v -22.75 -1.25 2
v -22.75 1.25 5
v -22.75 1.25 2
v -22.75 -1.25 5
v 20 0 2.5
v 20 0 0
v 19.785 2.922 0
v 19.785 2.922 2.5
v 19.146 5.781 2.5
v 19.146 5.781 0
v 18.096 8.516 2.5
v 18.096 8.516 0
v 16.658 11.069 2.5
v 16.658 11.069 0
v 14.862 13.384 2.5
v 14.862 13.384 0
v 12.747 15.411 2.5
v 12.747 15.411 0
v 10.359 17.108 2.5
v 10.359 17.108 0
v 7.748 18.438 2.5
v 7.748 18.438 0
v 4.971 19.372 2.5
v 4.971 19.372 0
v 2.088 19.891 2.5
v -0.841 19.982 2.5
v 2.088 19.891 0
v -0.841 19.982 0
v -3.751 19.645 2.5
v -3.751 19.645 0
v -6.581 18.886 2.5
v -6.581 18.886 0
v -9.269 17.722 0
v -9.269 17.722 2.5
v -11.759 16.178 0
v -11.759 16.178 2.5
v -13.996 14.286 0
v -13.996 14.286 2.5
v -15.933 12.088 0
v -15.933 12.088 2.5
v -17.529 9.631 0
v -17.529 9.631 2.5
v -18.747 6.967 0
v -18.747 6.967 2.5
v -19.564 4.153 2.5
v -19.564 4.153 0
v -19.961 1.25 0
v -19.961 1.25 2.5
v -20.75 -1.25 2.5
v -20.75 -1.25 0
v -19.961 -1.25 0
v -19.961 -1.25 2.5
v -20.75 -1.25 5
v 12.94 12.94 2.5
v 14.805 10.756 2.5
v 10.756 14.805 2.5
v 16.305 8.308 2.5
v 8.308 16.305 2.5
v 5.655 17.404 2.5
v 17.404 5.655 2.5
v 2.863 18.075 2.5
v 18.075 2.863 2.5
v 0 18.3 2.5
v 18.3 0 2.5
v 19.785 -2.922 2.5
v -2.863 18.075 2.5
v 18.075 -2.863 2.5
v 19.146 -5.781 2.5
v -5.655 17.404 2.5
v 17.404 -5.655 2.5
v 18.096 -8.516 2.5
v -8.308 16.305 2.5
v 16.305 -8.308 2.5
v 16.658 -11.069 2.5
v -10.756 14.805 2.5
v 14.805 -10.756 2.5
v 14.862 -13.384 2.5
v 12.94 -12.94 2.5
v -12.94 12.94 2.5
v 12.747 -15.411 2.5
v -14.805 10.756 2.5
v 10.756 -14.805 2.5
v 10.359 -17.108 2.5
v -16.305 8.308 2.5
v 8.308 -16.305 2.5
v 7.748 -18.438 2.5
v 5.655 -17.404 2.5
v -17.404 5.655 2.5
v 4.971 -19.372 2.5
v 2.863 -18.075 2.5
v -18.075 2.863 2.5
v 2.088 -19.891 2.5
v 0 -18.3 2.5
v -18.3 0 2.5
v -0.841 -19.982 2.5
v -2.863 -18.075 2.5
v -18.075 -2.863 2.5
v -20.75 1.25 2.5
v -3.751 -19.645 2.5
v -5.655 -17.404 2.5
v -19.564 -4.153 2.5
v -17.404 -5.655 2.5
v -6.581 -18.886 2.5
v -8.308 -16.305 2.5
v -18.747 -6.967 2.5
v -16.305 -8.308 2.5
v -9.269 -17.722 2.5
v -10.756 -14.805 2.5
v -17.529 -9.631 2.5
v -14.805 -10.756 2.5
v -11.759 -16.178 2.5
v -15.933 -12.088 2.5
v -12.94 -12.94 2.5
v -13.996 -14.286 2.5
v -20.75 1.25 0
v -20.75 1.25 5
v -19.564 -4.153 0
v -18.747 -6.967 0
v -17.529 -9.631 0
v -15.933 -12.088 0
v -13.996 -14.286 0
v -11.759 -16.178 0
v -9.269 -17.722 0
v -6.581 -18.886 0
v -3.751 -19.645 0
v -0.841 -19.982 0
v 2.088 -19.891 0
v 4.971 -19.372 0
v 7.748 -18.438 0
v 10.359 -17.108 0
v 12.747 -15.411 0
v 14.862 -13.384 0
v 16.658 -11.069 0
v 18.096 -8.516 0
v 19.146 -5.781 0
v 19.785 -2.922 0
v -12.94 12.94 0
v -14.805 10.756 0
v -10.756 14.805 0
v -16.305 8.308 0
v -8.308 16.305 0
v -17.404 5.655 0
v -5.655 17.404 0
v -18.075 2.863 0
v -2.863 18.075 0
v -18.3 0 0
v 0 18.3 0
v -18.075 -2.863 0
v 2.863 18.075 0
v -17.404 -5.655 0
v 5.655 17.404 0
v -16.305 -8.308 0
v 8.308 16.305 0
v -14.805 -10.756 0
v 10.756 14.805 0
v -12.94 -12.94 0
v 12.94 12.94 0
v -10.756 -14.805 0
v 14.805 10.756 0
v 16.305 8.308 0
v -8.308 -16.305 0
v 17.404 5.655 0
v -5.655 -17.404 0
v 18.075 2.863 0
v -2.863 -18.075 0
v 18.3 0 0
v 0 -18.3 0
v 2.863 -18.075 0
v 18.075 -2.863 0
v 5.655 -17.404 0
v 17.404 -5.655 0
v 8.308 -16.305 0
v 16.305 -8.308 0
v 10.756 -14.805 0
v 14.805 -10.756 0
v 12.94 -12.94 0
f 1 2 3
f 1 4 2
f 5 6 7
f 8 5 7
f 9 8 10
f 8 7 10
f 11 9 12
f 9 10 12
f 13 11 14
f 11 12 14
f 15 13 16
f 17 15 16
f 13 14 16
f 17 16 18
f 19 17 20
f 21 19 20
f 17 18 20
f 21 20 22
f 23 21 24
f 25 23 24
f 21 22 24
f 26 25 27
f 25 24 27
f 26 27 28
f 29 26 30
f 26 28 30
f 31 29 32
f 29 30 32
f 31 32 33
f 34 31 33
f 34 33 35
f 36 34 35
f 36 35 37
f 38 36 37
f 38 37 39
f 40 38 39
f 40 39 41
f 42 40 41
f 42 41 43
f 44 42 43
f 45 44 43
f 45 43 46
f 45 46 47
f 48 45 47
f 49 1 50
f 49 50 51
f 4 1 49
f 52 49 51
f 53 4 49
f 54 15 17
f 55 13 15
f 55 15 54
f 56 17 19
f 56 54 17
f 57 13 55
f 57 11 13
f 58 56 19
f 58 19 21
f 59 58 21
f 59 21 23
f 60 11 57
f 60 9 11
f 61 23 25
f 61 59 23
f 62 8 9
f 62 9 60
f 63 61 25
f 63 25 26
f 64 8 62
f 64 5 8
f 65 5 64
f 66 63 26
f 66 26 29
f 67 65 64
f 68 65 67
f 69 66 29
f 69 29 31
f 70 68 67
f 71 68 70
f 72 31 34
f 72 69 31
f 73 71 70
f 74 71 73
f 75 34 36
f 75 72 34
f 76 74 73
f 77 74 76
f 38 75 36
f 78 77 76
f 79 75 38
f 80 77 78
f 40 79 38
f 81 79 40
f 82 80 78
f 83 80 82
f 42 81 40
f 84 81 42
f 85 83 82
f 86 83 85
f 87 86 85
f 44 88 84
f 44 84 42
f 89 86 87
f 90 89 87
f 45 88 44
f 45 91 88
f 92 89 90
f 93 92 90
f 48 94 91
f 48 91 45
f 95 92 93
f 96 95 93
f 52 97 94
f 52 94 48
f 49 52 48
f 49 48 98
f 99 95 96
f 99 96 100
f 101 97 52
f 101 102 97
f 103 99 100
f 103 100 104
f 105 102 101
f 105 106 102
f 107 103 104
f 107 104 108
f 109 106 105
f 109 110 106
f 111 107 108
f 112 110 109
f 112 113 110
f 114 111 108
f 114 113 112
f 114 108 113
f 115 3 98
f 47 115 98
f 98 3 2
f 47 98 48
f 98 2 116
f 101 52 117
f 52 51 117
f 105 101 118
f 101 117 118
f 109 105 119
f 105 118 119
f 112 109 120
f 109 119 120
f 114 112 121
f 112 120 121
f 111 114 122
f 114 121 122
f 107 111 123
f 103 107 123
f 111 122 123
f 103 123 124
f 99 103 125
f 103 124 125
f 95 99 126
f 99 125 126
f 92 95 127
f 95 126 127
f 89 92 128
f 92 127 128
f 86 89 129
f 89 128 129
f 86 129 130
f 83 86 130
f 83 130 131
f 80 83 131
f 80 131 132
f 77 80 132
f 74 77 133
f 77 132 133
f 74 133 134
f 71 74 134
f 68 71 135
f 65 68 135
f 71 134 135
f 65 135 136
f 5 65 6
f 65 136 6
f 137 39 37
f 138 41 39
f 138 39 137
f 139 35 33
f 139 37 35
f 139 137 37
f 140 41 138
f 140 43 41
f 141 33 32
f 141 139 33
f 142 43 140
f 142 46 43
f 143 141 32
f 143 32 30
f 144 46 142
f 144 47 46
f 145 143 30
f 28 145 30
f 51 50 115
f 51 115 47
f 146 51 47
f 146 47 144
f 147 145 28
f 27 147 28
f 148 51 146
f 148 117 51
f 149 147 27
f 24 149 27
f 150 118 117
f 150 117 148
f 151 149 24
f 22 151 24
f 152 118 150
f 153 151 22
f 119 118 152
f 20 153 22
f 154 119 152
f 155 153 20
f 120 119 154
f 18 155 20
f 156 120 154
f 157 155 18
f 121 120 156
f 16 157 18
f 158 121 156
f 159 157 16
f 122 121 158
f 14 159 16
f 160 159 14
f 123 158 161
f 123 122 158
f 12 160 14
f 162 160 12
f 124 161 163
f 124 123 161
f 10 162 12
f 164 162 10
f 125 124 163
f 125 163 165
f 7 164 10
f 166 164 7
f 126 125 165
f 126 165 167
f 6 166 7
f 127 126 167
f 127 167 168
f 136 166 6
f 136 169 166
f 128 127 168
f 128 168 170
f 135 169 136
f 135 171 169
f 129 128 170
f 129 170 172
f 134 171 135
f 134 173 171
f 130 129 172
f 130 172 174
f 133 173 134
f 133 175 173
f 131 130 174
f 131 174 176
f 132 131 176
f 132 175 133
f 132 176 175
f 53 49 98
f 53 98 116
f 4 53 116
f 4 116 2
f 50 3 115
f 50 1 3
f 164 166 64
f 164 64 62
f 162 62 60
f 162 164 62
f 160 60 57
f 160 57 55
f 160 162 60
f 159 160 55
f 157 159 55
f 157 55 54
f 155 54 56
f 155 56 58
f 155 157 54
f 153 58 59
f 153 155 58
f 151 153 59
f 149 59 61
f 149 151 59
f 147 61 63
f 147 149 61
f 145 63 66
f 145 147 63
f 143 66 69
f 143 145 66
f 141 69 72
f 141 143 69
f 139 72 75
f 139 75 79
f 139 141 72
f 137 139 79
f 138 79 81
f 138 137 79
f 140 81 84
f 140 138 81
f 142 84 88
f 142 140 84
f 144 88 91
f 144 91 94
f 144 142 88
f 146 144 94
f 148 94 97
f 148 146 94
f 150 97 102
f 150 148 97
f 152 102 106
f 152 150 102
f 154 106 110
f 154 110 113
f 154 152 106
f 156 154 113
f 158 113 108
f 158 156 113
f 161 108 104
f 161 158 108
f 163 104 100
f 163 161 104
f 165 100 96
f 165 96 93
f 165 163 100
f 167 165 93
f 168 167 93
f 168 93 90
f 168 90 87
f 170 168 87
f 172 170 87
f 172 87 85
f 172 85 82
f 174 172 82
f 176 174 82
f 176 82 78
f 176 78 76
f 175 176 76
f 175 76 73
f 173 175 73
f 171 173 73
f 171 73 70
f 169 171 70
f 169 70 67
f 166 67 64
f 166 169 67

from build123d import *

# Parameters (mm, degrees)
F0_R     = 20
F0_R_2   = 18.3
F1_DEPTH = 2.5
F3_DEPTH = 1.25


with BuildPart() as f1:
    # F0 (on Top) → F1 (new body)
    with BuildSketch(Plane.XY):
        Circle(F0_R)
        Circle(F0_R_2, mode=Mode.SUBTRACT)
    extrude(amount=F1_DEPTH)

    # F2 (on Front) → F3 (join, symmetric)
    with BuildSketch(Plane.XZ):
        Polygon((-20.75, 0), (-19.25, 0), (-19.25, 2.5), (-20.75, 2.5), (-20.75, 5), (-22.75, 5), (-22.75, 2), align=None)
    extrude(amount=F3_DEPTH, both=True)


solid = f1.part
